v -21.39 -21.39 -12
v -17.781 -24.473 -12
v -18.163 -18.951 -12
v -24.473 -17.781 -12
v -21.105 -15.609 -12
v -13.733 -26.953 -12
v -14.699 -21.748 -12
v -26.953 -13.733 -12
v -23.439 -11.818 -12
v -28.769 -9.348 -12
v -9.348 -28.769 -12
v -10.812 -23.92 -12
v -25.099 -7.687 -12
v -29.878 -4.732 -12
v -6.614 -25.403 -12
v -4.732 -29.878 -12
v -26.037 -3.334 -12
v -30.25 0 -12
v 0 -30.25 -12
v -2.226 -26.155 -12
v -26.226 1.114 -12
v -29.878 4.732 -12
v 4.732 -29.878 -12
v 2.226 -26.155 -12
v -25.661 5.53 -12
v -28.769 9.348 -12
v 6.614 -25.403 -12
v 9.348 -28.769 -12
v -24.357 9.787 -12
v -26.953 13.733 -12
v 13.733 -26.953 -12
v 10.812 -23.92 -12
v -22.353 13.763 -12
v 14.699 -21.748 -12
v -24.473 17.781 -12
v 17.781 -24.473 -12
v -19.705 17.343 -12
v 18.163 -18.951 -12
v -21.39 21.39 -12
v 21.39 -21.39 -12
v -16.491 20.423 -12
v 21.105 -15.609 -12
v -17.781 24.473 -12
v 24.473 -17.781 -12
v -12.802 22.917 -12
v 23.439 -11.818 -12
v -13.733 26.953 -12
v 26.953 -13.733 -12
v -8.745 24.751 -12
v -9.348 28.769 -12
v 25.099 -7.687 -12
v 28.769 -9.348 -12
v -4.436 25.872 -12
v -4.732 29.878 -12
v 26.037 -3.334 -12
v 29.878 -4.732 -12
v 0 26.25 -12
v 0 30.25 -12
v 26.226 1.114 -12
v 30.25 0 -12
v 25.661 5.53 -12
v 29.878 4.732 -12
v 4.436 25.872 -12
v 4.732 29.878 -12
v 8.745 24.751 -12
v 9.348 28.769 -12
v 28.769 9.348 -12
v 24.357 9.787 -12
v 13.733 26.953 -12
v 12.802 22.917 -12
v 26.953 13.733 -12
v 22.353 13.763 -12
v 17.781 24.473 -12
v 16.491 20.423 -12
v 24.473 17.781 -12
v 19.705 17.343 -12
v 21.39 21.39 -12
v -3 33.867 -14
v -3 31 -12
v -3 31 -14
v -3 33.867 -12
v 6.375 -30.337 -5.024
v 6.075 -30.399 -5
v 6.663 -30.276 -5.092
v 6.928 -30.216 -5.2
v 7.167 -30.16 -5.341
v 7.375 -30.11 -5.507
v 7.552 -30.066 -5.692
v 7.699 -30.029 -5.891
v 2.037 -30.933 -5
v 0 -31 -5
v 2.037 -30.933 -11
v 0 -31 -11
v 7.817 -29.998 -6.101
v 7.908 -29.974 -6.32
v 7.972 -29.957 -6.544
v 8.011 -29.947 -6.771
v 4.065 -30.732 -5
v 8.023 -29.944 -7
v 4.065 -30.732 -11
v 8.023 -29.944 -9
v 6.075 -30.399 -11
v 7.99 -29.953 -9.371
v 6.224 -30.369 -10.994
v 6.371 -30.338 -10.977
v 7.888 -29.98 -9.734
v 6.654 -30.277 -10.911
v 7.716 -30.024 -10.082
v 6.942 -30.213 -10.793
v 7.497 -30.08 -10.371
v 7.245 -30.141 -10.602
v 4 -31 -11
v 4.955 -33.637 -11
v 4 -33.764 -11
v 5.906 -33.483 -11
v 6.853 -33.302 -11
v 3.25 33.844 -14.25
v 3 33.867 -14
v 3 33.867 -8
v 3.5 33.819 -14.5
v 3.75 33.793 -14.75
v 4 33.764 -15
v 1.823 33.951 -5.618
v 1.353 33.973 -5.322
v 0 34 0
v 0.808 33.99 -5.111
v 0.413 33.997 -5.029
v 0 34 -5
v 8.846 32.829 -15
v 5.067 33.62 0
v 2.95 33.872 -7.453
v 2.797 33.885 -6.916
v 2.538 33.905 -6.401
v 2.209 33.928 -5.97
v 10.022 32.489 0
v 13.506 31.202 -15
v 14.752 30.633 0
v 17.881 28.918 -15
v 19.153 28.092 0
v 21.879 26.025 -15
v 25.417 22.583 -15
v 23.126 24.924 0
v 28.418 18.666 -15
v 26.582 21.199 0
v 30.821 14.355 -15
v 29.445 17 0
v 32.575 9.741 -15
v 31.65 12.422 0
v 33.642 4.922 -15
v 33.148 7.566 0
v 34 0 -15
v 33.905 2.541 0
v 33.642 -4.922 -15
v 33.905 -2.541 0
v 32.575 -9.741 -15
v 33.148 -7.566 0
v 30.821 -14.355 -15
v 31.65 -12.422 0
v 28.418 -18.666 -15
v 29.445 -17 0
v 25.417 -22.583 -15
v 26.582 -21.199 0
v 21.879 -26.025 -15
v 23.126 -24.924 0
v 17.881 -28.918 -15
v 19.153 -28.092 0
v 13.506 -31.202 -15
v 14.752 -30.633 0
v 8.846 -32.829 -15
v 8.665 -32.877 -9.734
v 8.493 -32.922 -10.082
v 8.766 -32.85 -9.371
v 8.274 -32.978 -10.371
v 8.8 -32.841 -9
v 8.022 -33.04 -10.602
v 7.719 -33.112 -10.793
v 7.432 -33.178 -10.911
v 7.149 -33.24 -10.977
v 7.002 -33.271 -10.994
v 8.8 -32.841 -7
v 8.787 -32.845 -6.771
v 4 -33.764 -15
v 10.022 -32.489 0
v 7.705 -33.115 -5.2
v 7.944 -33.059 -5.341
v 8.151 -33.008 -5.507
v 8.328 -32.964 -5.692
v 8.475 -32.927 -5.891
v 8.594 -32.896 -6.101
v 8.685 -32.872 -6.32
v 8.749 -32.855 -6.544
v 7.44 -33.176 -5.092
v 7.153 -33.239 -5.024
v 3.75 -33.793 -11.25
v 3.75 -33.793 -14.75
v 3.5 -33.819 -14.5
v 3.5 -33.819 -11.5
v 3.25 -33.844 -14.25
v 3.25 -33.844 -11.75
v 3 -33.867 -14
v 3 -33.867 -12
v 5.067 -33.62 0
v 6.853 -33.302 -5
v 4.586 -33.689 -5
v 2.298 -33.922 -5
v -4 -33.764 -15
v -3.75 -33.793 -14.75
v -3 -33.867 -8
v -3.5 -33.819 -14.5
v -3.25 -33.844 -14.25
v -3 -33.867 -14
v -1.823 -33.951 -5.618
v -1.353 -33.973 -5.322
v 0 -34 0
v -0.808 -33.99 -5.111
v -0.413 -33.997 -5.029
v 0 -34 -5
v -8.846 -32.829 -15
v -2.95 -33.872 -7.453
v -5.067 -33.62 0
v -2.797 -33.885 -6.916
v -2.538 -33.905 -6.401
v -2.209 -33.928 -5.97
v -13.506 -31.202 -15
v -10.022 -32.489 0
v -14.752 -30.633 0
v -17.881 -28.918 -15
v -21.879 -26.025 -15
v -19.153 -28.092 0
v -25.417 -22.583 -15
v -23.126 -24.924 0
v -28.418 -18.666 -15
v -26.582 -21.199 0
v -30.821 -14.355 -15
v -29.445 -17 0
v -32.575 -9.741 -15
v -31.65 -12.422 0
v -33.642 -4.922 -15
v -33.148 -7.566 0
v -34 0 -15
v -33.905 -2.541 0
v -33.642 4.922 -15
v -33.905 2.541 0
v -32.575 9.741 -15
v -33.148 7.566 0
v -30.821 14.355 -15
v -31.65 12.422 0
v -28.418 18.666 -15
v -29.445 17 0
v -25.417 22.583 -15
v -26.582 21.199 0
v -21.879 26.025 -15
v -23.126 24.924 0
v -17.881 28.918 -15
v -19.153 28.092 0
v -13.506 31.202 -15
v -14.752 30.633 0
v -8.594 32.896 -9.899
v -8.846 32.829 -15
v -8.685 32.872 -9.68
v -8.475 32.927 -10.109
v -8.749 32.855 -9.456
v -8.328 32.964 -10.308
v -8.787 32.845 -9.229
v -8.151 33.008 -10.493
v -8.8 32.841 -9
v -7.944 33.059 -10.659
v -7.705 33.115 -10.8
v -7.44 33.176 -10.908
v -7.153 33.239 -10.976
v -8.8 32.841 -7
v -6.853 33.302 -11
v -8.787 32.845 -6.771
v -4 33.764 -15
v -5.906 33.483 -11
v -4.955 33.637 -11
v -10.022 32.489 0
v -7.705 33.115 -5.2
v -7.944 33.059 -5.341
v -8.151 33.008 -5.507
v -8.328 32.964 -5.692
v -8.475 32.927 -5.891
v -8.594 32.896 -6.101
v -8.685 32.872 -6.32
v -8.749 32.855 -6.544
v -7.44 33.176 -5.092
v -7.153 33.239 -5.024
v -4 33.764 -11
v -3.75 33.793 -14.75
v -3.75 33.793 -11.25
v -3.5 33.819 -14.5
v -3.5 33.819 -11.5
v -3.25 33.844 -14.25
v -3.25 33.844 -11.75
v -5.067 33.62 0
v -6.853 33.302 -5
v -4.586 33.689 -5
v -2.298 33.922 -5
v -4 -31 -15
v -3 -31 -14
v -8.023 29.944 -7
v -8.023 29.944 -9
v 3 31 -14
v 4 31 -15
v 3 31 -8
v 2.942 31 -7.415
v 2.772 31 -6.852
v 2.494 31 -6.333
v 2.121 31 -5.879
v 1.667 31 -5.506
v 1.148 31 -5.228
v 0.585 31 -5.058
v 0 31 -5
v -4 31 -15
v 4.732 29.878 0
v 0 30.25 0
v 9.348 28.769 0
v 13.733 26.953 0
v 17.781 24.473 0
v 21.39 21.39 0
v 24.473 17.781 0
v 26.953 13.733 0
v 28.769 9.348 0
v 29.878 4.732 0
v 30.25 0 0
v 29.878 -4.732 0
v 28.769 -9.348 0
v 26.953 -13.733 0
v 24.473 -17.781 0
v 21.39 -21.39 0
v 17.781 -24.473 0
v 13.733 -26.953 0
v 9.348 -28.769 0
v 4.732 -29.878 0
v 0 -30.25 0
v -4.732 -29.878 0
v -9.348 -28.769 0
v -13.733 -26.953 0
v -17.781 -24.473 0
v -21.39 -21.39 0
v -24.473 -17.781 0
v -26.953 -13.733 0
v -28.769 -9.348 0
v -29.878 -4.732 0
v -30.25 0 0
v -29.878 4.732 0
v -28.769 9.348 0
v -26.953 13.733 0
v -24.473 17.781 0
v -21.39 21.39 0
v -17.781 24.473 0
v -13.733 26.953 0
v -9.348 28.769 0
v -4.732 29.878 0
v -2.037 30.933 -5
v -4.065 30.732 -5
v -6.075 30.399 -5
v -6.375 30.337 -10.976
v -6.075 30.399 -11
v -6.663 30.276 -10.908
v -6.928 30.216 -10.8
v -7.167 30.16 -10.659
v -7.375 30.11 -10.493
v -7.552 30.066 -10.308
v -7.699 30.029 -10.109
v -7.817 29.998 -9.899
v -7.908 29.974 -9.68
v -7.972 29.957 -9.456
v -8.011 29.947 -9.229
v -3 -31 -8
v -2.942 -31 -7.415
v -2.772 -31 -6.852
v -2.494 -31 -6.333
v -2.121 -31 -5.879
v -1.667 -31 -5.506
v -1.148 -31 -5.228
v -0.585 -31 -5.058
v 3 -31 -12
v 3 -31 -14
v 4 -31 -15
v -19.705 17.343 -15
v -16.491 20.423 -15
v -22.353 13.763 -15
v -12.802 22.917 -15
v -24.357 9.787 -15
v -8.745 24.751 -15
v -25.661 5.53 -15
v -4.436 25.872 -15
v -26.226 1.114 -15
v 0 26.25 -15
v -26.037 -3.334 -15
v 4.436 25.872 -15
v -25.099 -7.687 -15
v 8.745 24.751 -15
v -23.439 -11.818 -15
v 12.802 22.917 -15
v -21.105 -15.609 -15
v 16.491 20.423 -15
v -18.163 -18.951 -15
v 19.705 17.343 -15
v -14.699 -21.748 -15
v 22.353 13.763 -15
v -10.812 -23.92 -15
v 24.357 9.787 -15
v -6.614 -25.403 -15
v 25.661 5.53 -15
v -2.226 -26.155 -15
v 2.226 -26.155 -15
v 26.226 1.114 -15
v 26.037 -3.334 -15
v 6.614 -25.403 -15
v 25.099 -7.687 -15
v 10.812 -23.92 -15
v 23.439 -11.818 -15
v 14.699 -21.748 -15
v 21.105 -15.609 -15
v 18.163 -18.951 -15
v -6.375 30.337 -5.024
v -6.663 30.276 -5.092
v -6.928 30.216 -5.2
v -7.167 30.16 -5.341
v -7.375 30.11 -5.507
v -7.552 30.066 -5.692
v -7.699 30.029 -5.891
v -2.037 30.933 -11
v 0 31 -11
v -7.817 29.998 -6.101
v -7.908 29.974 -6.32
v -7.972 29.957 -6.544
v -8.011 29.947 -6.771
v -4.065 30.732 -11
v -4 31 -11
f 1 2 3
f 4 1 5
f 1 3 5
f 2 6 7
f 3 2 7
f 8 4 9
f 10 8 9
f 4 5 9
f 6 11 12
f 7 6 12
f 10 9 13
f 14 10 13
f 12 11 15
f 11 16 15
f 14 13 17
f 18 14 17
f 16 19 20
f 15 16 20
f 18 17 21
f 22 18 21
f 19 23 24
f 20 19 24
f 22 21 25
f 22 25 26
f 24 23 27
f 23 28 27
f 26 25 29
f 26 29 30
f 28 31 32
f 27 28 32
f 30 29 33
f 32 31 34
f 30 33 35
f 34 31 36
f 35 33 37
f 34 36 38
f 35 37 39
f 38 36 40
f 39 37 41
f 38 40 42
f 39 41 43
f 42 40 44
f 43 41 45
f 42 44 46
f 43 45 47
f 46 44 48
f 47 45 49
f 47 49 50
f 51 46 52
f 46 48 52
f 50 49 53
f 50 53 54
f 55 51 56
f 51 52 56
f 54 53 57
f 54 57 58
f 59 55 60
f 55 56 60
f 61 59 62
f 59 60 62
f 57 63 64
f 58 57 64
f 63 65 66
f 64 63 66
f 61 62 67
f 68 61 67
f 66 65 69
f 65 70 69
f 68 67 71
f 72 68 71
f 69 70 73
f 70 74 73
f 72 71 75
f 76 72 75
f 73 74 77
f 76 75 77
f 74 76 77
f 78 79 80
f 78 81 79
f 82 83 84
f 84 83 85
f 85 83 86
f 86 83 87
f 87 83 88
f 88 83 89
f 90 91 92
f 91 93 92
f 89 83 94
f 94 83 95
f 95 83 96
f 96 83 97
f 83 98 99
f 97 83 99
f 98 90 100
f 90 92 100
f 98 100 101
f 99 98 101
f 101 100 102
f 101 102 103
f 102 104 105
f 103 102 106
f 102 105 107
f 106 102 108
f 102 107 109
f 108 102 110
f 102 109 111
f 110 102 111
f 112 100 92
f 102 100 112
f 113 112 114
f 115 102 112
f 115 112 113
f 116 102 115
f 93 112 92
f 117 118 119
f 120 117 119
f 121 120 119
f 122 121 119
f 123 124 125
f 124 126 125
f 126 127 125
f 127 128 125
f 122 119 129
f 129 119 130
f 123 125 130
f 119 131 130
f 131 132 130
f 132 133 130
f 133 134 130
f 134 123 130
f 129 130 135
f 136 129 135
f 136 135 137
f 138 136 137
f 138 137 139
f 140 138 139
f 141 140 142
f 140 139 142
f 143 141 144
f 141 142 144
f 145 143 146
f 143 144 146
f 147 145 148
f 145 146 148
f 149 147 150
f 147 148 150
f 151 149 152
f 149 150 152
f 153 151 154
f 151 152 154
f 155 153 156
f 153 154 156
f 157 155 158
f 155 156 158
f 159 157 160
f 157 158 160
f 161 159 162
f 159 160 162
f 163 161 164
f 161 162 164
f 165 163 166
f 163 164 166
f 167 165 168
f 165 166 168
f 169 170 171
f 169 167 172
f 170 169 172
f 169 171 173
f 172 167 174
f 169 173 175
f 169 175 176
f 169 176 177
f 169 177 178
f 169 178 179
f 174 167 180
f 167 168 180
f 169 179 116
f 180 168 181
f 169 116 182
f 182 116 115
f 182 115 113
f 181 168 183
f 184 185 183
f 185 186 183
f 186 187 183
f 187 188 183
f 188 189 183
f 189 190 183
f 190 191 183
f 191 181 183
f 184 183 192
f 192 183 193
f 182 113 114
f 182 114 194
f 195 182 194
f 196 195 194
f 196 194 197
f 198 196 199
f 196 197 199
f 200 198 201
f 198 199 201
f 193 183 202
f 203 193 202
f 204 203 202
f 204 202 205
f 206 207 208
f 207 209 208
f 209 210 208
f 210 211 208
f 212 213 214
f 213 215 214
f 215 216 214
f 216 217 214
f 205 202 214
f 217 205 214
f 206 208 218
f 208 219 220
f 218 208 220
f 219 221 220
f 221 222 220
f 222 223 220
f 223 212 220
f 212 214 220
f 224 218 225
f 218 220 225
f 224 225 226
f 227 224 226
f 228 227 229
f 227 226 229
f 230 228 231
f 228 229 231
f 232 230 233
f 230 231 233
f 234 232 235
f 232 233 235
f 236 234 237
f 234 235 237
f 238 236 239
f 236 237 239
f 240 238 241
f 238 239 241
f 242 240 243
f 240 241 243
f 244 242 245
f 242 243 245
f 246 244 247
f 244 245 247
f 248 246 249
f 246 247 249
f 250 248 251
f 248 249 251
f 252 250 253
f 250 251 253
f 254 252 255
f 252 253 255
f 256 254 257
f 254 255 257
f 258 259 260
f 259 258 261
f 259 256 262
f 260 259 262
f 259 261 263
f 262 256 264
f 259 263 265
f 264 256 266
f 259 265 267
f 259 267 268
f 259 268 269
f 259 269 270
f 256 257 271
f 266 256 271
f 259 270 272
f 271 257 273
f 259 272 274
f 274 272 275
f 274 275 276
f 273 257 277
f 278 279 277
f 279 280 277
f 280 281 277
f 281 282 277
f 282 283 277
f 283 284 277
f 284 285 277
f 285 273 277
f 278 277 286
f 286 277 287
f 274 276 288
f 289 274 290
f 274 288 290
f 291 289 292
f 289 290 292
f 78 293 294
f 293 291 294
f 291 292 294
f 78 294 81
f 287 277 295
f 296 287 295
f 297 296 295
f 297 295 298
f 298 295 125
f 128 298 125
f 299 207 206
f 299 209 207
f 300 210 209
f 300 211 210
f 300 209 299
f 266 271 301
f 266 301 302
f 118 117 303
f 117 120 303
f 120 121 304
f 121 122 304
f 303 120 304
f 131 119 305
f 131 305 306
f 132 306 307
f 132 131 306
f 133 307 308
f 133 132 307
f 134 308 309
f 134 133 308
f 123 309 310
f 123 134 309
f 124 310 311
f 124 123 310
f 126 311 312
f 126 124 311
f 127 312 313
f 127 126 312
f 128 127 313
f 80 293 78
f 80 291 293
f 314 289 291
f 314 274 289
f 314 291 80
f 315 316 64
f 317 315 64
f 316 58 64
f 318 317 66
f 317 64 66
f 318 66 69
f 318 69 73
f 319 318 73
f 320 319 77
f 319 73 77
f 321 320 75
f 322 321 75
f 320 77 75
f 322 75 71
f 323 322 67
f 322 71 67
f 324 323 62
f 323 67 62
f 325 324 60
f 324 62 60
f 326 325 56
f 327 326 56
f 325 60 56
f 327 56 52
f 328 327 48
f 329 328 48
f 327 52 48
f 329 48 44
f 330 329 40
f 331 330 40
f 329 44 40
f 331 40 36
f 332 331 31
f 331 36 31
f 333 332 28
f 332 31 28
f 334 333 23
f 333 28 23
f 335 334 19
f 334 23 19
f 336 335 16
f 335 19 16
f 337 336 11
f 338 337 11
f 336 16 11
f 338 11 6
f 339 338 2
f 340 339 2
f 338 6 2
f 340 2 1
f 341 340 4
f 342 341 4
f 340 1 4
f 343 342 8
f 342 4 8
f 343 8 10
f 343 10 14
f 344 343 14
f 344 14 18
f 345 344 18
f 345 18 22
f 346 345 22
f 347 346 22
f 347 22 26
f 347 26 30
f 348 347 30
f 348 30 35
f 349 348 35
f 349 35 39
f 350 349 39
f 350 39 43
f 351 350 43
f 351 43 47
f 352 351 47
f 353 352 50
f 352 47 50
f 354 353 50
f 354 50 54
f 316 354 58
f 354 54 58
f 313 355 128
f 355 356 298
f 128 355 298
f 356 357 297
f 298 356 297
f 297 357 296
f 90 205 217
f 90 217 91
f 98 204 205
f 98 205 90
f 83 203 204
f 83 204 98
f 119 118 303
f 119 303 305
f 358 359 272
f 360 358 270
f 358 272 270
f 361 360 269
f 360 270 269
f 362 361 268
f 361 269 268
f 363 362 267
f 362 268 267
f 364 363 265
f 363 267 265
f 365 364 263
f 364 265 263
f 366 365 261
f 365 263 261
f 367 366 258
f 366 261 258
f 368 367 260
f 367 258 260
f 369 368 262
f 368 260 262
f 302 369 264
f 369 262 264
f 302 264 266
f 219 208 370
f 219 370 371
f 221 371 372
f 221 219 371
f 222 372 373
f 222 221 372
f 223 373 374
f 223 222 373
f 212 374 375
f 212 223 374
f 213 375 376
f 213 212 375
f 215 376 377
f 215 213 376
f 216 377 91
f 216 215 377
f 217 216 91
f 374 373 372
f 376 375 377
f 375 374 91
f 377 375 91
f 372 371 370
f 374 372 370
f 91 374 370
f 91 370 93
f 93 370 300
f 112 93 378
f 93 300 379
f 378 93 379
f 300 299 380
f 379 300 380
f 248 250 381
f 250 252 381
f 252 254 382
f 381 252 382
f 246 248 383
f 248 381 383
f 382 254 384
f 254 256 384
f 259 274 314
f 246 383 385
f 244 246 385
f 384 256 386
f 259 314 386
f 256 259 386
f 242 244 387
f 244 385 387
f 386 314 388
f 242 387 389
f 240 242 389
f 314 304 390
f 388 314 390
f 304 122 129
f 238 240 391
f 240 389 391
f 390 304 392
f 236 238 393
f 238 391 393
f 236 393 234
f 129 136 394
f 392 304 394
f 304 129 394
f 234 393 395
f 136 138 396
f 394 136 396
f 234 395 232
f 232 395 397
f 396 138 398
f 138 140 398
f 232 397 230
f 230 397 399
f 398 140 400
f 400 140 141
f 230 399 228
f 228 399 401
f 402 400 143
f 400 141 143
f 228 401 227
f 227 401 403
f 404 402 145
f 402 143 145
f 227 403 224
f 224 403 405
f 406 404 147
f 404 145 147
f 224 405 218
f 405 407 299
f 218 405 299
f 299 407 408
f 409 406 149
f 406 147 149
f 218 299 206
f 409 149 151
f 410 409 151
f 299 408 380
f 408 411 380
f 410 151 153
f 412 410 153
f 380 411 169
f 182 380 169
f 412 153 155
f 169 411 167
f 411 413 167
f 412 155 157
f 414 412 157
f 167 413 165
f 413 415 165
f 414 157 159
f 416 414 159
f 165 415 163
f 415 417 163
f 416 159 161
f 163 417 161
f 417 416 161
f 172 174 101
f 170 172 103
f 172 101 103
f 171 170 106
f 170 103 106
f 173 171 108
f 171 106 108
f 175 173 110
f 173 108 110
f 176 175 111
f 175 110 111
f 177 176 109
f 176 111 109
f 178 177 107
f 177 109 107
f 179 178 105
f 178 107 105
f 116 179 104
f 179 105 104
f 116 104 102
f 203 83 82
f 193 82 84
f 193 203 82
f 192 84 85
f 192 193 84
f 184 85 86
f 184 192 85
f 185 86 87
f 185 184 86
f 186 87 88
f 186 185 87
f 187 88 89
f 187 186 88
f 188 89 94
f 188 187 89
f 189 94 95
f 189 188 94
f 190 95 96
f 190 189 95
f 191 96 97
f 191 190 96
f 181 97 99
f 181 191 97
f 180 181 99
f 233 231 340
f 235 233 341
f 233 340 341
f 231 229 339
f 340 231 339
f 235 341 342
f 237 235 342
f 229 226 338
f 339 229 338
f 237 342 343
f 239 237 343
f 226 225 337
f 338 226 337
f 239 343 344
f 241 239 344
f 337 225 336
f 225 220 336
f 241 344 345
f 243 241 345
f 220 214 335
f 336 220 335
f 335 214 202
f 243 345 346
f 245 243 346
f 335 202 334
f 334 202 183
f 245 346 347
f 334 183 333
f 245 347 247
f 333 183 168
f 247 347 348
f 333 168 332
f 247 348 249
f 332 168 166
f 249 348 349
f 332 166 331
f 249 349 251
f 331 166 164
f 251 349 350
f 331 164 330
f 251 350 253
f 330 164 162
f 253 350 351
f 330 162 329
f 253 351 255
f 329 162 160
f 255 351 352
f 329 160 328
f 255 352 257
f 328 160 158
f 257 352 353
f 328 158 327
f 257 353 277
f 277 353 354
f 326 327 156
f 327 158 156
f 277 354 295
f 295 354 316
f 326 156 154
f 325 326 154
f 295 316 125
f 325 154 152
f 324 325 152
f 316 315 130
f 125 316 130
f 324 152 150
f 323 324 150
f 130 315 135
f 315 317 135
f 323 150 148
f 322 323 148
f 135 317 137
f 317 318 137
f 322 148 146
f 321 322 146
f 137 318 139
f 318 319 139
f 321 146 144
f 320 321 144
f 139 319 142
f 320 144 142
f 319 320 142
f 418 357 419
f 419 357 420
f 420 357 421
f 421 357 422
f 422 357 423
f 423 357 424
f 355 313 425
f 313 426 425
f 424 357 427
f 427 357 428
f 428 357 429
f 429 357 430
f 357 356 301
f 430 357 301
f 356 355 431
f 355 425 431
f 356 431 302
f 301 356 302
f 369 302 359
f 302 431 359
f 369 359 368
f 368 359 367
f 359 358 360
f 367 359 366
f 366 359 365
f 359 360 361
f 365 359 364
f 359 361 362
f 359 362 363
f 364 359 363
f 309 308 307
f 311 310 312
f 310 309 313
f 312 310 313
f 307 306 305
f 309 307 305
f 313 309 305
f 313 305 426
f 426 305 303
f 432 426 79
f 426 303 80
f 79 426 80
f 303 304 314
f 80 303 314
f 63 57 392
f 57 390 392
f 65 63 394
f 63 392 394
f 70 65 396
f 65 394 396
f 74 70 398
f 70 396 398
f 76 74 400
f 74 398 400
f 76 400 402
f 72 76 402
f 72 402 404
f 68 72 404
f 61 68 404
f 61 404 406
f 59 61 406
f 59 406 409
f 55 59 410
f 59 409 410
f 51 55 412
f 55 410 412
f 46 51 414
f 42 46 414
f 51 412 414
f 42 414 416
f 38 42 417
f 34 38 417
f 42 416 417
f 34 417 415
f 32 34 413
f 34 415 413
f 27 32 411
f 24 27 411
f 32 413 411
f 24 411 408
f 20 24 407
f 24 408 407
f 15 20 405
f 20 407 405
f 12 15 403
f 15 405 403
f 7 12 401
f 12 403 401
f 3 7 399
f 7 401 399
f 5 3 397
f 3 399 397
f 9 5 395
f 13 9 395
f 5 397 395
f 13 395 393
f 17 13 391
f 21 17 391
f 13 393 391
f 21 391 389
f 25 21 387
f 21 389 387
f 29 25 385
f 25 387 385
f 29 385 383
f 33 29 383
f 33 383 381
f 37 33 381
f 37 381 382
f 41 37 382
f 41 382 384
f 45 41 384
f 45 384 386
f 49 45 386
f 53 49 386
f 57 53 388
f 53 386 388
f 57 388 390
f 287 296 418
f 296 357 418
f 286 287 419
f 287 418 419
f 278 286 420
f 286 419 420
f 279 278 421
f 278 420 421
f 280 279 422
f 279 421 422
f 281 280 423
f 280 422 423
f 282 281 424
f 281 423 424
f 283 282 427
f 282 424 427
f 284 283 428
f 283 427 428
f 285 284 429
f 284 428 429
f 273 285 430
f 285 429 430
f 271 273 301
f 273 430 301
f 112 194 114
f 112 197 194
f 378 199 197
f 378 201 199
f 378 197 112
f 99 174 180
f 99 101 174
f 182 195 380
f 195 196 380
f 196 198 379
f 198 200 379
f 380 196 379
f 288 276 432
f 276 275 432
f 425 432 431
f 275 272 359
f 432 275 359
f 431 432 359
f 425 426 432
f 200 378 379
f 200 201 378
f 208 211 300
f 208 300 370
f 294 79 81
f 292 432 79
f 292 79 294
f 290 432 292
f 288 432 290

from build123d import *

# Parameters (mm, degrees)
CUT_EXTRUDE_1_DEPTH = 3
CUT_EXTRUDE_2_DEPTH = 3
CUT_REVOLVE_1_ANGLE = 15
CUT_REVOLVE_2_ANGLE = 15
CHAMFER_1_SIZE      = 1
CHAMFER_2_SIZE      = 1
FILLET_1_R          = 2
FILLET_2_R          = 2


with BuildPart() as part:
    # Эскиз2 → Повернуть1 (revolve)
    with BuildSketch(Plane(origin=(0, 0, 0), x_dir=(0, 0, -1), z_dir=(1, 0, 0))):
        Polygon((0, 30.25), (12, 30.25), (12, 26.25), (15, 26.25), (15, 34), (0, 34), align=None)
    revolve(axis=Axis((0, 0, 0), (0, 0, -1)))

    # Эскиз4 → Вырез-Вытянуть1 (cut)
    with BuildSketch(Plane(origin=(0, 34, 0), x_dir=(1, 0, 0), z_dir=(0, 1, 0))):
        with BuildLine():
            Line((3, 15), (3, 8))
            ThreePointArc((3, 8), (0, 5), (-3, 8))
            Line((-3, 8), (-3, 15))
            ThreePointArc((-3, 15), (0, 18), (3, 15))
        make_face()
    extrude(amount=-CUT_EXTRUDE_1_DEPTH, mode=Mode.SUBTRACT)

    # Эскиз5 → Вырез-Вытянуть2 (cut)
    with BuildSketch(Plane(origin=(0, -34, 0), x_dir=(-1, 0, 0), z_dir=(0, -1, 0))):
        with BuildLine():
            Line((3, 15), (3, 8))
            ThreePointArc((3, 8), (0, 5), (-3, 8))
            Line((-3, 8), (-3, 15))
            ThreePointArc((-3, 15), (0, 18), (3, 15))
        make_face()
    extrude(amount=-CUT_EXTRUDE_2_DEPTH, mode=Mode.SUBTRACT)

    # Эскиз8 → Вырез-Повернуть1 (revolve, cut)
    with BuildSketch(Plane(origin=(0, 0, 0), x_dir=(0, 0, -1), z_dir=(1, 0, 0))):
        Polygon((5, 34), (5, 31), (11, 31), (11, 34), (11, 37), (5, 37), align=None)
    revolve(axis=Axis((0, 0, 0), (0, 0, 1)), revolution_arc=CUT_REVOLVE_1_ANGLE, mode=Mode.SUBTRACT)

    # Эскиз9 → Вырез-Повернуть2 (revolve, cut)
    with BuildSketch(Plane(origin=(0, 0, 0), x_dir=(0, 0, -1), z_dir=(1, 0, 0))):
        Polygon((5, -34), (5, -31), (11, -31), (11, -34), (11, -37.830503046), (5, -37.830503046), align=None)
    revolve(axis=Axis((0, 0, 0), (0, 0, 1)), revolution_arc=CUT_REVOLVE_2_ANGLE, mode=Mode.SUBTRACT)

    # Фаска1
    chamfer_1_edges = [part.edges().sort_by_distance(p)[0] for p in [
        (3, 32.433694222, -15),
        (-3, 32.433694222, -15),
        (-3, -32.433694222, -15),
        (3, -32.433694222, -15),
    ]]
    chamfer(chamfer_1_edges, length=CHAMFER_1_SIZE)

    # Фаска2
    chamfer_2_edges = [part.edges().sort_by_distance(p)[0] for p in [
        (-3, 32.433694222, -11),
        (3, -32.433694222, -11),
    ]]
    chamfer(chamfer_2_edges, length=CHAMFER_2_SIZE)

    # Скругление1
    fillet_1_edges = [part.edges().sort_by_distance(p)[0] for p in [
        (8.411618966, -31.392589354, -5),
        (8.411618966, -31.392589354, -11),
    ]]
    fillet(fillet_1_edges, radius=FILLET_1_R)

    # Скругление2
    fillet_2_edges = [part.edges().sort_by_distance(p)[0] for p in [
        (-8.411618966, 31.392589354, -5),
        (-8.411618966, 31.392589354, -11),
    ]]
    fillet(fillet_2_edges, radius=FILLET_2_R)


solid = part.part
